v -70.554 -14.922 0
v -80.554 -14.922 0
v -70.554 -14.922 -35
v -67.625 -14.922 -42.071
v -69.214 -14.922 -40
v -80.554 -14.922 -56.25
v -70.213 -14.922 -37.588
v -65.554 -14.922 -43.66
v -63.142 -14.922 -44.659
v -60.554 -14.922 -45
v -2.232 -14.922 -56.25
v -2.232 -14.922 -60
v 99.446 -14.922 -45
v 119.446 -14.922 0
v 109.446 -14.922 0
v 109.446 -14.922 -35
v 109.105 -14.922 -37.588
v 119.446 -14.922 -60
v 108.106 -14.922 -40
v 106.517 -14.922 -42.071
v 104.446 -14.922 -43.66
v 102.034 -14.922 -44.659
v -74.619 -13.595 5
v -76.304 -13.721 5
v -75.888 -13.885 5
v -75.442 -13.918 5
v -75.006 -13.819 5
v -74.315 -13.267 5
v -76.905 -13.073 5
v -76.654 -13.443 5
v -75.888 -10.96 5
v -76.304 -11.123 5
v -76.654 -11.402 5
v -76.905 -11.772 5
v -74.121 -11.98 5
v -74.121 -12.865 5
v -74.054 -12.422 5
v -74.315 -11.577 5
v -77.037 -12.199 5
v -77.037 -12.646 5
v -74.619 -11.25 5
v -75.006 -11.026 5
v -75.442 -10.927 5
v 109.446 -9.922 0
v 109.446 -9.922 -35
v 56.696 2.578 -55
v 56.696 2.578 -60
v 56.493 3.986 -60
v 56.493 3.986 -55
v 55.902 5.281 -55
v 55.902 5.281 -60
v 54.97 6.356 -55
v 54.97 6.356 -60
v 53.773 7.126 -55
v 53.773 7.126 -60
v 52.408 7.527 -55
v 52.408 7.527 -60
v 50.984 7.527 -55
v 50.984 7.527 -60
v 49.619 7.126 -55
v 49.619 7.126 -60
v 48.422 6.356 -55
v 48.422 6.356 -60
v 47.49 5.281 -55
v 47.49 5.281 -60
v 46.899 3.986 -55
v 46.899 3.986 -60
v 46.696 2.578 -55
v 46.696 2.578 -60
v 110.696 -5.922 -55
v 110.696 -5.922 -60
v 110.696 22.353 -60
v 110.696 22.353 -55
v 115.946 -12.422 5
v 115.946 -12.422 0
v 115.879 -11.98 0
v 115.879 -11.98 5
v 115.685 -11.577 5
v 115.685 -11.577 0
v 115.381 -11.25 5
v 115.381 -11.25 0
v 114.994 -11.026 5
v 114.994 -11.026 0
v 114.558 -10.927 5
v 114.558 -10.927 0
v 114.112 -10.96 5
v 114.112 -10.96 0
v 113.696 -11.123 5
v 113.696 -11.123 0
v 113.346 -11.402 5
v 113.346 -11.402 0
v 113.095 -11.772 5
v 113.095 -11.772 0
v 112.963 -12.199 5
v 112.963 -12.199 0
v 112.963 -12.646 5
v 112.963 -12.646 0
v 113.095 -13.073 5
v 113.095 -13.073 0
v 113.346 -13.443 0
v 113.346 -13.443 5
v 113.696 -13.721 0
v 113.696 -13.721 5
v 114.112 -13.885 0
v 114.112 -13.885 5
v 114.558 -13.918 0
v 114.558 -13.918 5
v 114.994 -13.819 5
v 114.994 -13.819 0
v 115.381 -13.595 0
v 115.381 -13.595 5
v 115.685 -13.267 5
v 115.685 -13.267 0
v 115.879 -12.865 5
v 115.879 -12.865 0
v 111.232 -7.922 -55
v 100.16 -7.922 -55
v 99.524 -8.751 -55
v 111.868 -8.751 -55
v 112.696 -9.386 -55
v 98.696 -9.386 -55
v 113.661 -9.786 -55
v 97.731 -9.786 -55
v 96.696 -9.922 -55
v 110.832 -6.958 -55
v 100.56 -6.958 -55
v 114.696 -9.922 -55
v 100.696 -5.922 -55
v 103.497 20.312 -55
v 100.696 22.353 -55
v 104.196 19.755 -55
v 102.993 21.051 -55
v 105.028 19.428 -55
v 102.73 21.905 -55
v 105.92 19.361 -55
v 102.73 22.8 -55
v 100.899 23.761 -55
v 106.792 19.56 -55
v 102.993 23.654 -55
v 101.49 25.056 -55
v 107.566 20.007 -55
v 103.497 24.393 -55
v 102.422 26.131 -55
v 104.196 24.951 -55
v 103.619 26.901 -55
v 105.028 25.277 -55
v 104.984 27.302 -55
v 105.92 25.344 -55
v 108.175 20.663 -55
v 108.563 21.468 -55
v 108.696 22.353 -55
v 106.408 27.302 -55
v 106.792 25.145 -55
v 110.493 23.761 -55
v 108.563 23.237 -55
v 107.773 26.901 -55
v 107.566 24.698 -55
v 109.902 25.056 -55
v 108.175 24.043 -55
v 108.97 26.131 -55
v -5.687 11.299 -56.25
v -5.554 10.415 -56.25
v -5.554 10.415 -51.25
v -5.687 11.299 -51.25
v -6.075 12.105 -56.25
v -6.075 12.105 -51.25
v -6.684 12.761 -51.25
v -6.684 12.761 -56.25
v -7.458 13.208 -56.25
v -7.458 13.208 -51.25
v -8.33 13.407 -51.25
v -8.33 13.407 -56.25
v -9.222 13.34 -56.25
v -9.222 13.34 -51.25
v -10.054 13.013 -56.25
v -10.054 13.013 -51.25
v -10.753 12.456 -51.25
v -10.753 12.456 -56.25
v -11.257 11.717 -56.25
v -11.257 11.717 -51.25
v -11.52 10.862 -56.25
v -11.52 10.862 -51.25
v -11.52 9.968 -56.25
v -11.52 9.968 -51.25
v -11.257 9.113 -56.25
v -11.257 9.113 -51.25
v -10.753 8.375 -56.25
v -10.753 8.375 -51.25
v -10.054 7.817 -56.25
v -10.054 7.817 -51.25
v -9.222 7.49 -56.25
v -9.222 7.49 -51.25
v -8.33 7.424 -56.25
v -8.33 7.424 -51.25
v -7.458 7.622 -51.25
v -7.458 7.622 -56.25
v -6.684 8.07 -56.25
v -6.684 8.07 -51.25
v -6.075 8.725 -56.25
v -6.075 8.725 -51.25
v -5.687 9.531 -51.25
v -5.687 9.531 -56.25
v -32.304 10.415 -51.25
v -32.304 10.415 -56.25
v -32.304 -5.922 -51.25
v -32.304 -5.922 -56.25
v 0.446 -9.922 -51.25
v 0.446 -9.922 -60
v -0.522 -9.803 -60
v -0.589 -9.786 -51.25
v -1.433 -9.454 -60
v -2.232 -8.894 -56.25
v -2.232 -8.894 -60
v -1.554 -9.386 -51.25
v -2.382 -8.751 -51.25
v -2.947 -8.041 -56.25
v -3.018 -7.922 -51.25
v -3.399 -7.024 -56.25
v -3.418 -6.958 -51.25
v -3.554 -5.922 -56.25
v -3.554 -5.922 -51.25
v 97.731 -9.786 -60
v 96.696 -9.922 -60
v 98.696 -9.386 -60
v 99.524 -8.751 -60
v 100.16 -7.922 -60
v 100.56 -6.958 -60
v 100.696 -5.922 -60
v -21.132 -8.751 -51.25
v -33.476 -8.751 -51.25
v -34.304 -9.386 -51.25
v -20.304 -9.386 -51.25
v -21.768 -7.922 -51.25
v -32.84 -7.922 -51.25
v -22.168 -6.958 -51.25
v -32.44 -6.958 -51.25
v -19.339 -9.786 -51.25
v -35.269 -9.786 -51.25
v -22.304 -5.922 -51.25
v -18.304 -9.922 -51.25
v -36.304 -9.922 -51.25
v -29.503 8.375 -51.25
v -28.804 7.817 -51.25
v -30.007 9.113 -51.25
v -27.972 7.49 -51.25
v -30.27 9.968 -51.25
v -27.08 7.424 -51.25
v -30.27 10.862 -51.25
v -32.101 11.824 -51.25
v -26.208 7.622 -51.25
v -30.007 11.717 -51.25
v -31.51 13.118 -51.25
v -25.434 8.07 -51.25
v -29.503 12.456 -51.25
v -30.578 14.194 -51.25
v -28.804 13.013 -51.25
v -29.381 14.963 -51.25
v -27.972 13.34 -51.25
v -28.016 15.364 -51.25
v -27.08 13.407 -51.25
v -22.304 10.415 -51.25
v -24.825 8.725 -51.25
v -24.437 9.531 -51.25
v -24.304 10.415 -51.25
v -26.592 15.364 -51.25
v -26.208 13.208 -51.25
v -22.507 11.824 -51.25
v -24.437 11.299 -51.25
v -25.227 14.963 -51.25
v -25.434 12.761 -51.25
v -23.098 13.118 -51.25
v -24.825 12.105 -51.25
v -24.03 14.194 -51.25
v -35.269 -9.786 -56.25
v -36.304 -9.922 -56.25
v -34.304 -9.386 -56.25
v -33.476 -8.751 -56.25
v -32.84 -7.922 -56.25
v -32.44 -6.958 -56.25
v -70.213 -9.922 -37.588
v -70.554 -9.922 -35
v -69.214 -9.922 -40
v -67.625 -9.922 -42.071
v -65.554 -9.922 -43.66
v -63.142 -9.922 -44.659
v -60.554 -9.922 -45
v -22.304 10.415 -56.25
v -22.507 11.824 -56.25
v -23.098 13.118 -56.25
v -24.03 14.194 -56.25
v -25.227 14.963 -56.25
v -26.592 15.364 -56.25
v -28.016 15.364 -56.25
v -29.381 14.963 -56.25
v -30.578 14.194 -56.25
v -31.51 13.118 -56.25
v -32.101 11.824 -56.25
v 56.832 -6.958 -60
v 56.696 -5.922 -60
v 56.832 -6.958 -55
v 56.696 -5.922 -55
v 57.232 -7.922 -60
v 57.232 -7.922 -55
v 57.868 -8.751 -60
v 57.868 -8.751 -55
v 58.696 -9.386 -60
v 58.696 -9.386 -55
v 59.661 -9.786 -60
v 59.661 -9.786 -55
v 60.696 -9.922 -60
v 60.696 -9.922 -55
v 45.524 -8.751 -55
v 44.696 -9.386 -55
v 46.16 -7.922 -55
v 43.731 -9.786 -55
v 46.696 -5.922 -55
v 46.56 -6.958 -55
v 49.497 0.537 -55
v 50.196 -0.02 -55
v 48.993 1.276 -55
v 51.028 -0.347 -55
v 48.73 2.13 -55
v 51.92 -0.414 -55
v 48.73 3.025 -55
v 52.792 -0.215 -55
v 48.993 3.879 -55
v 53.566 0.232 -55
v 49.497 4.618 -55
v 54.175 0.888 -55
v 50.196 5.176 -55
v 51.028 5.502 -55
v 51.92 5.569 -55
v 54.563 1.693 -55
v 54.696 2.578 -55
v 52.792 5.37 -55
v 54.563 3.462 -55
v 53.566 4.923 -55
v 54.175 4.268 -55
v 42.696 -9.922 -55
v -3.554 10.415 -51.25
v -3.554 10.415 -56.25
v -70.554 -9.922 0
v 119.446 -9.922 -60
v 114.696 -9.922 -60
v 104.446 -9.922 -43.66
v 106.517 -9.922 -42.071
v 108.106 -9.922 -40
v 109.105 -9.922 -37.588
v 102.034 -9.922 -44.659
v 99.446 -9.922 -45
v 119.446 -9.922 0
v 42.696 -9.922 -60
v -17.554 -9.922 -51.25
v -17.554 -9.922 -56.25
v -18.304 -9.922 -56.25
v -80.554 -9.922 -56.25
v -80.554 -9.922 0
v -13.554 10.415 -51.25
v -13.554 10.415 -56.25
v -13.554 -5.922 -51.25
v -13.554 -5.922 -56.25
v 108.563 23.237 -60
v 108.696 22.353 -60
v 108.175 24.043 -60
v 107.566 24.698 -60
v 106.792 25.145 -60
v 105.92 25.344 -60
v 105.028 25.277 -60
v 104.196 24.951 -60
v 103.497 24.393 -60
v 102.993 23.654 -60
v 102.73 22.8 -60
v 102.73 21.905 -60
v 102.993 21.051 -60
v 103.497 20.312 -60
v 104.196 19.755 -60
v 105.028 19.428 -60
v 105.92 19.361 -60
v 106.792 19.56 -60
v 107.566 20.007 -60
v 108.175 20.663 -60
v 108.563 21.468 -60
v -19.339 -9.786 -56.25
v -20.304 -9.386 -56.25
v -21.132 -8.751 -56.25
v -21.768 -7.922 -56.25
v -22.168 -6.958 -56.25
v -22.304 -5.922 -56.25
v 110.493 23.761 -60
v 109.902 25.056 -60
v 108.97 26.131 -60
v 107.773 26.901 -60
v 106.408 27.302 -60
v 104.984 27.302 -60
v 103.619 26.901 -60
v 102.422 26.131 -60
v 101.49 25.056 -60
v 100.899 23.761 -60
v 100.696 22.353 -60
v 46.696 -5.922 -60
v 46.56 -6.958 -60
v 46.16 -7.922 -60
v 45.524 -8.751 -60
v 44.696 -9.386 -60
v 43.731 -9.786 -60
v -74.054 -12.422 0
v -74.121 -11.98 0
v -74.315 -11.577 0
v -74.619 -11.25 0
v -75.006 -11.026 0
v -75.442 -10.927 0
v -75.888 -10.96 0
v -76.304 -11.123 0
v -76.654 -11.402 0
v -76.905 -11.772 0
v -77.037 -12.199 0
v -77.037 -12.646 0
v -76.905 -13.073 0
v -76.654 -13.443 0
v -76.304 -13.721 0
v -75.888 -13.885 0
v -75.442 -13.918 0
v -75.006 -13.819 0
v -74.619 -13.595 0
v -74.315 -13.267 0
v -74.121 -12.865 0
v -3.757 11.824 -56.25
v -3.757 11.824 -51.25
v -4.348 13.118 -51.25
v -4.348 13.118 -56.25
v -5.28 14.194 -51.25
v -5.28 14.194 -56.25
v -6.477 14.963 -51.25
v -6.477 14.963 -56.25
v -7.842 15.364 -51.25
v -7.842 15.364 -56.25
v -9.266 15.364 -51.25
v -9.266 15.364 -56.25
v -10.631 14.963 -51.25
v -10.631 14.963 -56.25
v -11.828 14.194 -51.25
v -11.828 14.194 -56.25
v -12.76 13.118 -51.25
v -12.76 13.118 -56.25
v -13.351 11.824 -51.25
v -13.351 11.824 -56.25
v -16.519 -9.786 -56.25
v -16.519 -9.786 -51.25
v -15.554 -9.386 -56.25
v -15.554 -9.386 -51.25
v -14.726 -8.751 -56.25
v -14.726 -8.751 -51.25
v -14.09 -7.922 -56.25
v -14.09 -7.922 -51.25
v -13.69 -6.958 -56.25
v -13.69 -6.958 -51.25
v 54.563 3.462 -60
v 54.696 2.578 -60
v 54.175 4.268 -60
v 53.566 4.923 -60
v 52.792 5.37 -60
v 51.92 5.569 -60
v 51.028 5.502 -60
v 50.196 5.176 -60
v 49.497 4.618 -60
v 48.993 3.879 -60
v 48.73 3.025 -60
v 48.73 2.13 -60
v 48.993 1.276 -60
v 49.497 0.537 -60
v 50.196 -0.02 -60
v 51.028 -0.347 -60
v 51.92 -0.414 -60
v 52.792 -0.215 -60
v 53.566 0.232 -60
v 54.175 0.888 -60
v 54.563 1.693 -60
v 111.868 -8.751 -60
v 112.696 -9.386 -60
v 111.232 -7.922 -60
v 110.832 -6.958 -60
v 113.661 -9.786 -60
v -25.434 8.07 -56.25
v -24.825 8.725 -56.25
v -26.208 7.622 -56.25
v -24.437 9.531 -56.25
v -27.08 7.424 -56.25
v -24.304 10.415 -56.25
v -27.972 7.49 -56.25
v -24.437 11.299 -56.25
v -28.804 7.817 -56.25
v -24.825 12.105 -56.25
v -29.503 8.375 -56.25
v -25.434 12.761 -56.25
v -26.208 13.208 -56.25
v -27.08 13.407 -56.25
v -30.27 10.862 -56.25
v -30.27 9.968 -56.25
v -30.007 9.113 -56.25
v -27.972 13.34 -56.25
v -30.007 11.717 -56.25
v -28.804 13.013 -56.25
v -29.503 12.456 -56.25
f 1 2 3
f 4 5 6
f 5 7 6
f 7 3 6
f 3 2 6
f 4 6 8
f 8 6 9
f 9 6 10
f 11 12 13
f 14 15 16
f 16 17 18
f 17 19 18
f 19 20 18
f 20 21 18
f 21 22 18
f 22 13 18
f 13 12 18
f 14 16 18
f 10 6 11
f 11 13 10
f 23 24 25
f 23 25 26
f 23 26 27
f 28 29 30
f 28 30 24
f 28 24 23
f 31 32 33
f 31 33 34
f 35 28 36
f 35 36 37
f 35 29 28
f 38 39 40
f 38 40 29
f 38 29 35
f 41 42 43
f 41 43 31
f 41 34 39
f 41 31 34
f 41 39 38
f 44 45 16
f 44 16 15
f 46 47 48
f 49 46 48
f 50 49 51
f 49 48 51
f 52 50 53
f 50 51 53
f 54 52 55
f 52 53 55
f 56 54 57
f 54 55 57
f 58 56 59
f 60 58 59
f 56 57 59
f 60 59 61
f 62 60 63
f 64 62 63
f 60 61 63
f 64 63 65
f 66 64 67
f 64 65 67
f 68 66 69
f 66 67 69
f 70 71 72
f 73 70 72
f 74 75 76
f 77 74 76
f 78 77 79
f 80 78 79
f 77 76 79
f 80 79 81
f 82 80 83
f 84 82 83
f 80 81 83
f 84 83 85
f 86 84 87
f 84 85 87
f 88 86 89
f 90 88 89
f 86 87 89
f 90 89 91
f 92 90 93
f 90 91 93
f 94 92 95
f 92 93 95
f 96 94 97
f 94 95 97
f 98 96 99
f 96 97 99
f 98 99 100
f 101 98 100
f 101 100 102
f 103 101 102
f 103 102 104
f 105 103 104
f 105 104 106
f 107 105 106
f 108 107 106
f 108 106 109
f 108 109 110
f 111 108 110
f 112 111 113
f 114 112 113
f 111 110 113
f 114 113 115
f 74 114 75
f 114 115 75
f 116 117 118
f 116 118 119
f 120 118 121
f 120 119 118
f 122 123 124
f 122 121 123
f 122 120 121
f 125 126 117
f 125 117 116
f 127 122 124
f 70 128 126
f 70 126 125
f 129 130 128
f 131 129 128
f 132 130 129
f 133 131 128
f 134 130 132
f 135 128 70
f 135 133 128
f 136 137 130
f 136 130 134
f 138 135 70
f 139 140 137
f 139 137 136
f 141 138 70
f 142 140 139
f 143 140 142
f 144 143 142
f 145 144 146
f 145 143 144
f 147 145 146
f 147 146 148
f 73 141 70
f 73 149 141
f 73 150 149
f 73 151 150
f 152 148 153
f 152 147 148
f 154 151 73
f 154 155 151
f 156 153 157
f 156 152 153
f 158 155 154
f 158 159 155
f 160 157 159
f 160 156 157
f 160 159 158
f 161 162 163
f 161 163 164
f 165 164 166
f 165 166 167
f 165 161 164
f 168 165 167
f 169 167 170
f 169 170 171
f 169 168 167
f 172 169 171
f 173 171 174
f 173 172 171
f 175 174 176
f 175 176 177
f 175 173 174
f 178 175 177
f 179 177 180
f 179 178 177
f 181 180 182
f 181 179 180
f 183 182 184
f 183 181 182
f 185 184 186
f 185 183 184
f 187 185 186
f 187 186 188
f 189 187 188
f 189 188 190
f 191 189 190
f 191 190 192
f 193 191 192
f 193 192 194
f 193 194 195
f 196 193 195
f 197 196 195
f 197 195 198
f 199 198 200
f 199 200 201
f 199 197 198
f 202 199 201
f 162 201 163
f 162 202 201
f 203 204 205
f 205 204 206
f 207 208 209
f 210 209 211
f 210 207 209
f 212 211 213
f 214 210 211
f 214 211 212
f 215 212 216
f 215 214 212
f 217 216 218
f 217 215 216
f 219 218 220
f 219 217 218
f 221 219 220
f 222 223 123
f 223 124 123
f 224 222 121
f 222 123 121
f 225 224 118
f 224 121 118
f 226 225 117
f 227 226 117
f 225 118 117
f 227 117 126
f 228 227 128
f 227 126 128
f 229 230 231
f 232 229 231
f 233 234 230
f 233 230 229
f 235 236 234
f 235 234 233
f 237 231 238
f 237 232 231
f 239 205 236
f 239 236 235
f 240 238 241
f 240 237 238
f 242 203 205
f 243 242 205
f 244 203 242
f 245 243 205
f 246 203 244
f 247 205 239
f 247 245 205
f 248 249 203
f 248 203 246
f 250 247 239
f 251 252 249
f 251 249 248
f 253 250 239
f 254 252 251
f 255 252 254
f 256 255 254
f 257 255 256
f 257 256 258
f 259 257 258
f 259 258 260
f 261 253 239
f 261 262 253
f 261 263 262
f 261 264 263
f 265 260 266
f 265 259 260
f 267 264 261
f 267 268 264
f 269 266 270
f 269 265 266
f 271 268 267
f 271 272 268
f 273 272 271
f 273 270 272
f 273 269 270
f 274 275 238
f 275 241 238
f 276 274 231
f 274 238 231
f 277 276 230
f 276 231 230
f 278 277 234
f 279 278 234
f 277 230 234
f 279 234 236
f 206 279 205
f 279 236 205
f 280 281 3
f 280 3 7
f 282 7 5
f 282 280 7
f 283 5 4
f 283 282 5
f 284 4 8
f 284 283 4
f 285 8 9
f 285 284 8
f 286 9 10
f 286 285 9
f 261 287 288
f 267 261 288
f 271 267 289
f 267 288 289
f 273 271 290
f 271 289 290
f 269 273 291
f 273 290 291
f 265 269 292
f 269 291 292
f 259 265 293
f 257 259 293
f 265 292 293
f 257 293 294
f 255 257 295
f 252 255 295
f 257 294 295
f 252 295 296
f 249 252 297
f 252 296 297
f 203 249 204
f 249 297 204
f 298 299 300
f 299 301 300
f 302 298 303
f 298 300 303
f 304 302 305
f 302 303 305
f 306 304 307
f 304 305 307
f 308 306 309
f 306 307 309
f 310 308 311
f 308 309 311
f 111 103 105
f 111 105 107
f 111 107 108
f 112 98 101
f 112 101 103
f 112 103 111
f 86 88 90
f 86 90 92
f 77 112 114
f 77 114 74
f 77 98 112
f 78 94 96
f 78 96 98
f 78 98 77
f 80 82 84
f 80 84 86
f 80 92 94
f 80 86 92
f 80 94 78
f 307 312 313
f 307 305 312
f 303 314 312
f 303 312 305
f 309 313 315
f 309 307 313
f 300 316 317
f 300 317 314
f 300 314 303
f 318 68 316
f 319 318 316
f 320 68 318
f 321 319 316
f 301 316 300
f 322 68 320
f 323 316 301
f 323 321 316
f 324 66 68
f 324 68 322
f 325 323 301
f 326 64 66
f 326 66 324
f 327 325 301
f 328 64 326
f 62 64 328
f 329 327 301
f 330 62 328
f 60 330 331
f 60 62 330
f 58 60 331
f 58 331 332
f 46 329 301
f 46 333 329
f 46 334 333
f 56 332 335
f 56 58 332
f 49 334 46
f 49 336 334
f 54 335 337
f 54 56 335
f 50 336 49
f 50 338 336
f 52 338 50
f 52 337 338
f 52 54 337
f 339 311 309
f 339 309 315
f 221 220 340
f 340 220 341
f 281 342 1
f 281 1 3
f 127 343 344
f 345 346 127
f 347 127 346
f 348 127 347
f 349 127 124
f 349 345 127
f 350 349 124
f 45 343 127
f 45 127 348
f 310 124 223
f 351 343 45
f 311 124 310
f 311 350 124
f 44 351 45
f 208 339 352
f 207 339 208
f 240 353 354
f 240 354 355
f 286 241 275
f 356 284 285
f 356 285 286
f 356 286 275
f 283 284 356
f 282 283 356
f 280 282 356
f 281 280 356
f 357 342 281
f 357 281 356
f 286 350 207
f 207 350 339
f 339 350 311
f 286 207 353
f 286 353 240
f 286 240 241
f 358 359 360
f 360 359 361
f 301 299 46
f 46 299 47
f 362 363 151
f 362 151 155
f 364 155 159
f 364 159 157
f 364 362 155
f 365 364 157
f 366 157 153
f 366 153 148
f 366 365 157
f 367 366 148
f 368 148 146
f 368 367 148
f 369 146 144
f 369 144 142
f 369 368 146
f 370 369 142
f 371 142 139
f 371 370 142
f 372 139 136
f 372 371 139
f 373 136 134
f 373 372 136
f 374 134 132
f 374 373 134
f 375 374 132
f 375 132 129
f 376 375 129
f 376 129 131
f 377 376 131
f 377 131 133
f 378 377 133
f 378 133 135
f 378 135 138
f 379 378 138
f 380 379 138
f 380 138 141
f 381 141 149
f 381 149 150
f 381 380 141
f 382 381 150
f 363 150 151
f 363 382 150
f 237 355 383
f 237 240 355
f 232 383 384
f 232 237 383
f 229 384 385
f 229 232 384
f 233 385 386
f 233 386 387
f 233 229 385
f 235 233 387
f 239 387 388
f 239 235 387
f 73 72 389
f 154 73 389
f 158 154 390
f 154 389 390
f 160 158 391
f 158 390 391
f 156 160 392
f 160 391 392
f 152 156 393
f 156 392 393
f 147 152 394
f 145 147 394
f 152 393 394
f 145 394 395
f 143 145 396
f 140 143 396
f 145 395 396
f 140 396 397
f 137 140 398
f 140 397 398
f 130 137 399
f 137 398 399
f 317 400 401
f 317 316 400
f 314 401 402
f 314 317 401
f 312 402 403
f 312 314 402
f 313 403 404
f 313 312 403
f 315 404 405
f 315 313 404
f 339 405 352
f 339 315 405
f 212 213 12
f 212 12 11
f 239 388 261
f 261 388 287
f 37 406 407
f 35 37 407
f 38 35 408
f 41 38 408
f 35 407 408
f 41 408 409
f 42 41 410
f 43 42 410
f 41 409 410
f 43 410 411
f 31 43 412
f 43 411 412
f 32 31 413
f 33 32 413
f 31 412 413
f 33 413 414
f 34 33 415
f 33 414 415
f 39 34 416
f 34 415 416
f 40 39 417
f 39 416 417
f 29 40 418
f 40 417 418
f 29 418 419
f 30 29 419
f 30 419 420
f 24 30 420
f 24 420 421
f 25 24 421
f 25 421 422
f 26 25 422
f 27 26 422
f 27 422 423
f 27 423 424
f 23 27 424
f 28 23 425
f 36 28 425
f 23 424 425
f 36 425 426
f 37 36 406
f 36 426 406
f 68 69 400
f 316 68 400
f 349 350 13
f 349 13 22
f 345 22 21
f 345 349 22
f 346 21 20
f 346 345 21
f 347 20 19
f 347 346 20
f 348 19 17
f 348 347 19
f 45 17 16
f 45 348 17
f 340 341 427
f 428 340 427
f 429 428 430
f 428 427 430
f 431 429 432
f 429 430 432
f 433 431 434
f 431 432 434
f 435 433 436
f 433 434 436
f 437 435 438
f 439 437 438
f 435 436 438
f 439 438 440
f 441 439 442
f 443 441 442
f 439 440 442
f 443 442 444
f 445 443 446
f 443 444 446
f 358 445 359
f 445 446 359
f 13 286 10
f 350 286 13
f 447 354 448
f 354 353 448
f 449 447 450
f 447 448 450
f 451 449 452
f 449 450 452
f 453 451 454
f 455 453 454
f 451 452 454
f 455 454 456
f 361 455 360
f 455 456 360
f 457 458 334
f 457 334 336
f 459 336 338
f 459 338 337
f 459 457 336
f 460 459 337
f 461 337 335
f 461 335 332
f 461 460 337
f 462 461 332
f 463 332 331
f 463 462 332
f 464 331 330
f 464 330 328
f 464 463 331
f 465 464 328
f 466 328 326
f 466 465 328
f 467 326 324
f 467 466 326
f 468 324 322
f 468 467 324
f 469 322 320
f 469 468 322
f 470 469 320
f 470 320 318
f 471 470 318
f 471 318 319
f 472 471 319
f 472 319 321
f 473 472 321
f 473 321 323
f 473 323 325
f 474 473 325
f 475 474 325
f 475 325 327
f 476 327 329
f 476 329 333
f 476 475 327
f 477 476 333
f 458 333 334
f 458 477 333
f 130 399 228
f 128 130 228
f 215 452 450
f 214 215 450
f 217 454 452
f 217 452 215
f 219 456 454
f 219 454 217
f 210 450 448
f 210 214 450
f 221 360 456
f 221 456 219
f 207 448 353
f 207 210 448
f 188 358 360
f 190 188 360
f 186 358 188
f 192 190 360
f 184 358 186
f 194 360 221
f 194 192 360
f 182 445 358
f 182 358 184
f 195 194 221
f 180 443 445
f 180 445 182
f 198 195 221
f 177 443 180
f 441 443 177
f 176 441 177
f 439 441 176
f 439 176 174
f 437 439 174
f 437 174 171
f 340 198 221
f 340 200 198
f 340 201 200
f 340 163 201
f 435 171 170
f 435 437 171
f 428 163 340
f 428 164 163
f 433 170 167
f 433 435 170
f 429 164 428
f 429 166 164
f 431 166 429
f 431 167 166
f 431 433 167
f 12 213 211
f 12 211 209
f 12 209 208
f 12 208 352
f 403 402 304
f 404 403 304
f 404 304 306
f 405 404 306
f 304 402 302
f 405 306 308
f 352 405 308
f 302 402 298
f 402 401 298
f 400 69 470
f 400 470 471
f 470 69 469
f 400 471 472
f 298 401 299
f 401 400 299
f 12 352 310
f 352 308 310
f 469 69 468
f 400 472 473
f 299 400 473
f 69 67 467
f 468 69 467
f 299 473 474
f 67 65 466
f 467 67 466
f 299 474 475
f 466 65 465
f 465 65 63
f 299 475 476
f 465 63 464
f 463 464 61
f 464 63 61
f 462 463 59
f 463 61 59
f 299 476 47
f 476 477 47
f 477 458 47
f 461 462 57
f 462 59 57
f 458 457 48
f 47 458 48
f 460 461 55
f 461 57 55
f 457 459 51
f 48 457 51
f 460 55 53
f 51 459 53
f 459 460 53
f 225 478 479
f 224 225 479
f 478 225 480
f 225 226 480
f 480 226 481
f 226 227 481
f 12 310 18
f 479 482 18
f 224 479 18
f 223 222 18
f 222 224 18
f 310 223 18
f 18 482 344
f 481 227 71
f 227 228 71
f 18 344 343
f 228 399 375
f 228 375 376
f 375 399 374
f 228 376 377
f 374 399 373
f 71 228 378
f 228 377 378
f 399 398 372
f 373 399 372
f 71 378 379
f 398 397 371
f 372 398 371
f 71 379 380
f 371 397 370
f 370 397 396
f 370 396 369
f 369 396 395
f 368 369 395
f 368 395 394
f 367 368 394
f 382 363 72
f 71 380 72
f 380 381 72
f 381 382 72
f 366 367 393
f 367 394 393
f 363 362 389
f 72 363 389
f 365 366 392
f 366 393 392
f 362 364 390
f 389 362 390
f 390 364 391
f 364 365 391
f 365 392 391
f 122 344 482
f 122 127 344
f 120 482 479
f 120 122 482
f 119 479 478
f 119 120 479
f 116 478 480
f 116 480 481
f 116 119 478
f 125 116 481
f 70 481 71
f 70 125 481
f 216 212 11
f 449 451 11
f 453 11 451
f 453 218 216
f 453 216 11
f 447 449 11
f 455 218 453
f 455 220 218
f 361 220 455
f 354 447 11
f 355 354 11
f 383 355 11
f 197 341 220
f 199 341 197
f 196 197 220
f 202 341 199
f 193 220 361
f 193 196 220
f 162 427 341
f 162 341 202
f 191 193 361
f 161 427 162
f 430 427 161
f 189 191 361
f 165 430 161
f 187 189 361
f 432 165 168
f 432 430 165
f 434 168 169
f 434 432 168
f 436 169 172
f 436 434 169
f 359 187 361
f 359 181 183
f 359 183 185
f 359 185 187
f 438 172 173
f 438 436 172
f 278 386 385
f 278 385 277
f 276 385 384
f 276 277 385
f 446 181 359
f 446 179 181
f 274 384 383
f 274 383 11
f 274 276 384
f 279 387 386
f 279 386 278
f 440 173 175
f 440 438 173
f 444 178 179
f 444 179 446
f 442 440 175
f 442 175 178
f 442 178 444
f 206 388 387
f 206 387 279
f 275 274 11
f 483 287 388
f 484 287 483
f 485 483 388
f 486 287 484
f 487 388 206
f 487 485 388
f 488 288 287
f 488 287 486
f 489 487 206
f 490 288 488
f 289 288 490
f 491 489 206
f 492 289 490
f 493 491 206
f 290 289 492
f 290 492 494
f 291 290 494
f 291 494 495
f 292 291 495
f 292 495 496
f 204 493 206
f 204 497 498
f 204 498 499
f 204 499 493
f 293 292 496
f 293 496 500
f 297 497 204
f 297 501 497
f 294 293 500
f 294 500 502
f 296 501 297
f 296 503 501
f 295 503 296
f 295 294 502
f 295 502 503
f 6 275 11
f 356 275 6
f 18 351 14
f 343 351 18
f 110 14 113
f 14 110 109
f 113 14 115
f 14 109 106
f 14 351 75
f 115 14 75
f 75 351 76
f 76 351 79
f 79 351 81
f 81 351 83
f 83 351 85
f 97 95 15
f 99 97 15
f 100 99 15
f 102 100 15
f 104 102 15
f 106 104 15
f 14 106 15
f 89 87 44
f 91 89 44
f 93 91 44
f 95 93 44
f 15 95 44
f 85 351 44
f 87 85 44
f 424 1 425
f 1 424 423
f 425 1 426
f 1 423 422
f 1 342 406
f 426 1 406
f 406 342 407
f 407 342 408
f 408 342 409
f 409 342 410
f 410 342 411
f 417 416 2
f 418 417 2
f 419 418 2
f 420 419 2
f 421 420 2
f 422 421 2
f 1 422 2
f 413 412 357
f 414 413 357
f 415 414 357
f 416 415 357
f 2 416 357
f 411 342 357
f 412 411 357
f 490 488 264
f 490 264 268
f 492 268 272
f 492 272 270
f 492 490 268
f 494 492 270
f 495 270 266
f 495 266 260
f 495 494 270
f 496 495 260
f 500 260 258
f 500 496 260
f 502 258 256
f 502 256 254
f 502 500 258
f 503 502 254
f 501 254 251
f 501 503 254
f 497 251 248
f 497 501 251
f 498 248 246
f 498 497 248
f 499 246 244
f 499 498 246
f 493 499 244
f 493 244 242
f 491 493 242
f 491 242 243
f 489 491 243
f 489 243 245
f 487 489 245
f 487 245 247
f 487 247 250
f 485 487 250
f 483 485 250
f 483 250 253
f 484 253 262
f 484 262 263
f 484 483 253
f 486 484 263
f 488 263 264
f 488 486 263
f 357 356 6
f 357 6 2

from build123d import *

# Parameters (mm, degrees)
BOSS_EXTRUDE1_DEPTH     = 40
SKETCH2_R               = 24
BOSS_EXTRUDE2_DEPTH     = 40
SKETCH3_R               = 24
BOSS_EXTRUDE3_DEPTH     = 40
SCALE1_SCALE            = 0.125
FILLET3_R               = 4
FILLET4_R               = 4
CUT_EXTRUDE1_DEPTH      = 38.275
CUT_EXTRUDE1_DEPTH_BACK = 6
CUT_EXTRUDE2_DEPTH      = 38.275
CUT_EXTRUDE2_DEPTH_BACK = 6
SKETCH6_R               = 1.5
BOSS_EXTRUDE4_DEPTH     = 5


with BuildPart() as part:
    # Sketch1 → Boss-Extrude1 (new body)
    with BuildSketch(Plane(origin=(0, 0, 0), x_dir=(1, 0, 0), z_dir=(0, 1, 0))):
        Polygon((-173.422280891, 480), (-173.422280891, 450), (-800, 450), (-800, -450), (-173.422280891, -450), (-173.422280891, -480), (800, -480), (800, 480), align=None)
    extrude(amount=-BOSS_EXTRUDE1_DEPTH)

    # Sketch2 → Boss-Extrude2 (add)
    with BuildSketch(Plane.XY.offset(480)):
        with BuildLine():
            Line((218, 0), (298, 0))
            Line((298, 0), (298, 100))
            ThreePointArc((298, 100), (258, 140), (218, 100))
            Line((218, 100), (218, 0))
        make_face()
        with Locations((258, 100)):
            Circle(SKETCH2_R, mode=Mode.SUBTRACT)
        with BuildLine():
            Line((650, 258.2), (650, 0))
            Line((650, 0), (730, 0))
            Line((730, 0), (730, 258.2))
            ThreePointArc((730, 258.2), (690, 298.2), (650, 258.2))
        make_face()
        with Locations((690, 258.2)):
            Circle(SKETCH2_R, mode=Mode.SUBTRACT)
        Polygon((650, 0), (298, 0), (218, 0), (-173.422280891, 0), (-173.422280891, -40), (800, -40), (800, 0), (730, 0), align=None)
    extrude(amount=-BOSS_EXTRUDE2_DEPTH)

    # Mirror1: part across plane


with BuildPart() as part_1:
    add(part.part)
    add(part.part.mirror(Plane.XY))

    # Sketch3 → Boss-Extrude3 (add)
    with BuildSketch(Plane.XY.offset(450)):
        with BuildLine():
            Line((-414, 0), (-334, 0))
            Line((-334, 0), (-334, 162.7))
            ThreePointArc((-334, 162.7), (-374, 202.7), (-414, 162.7))
            Line((-414, 162.7), (-414, 0))
        make_face()
        with Locations((-374, 162.7)):
            Circle(SKETCH3_R, mode=Mode.SUBTRACT)
        with BuildLine():
            Line((-264, 0), (-184, 0))
            Line((-184, 0), (-184, 162.7))
            ThreePointArc((-184, 162.7), (-224, 202.7), (-264, 162.7))
            Line((-264, 162.7), (-264, 0))
        make_face()
        with Locations((-224, 162.7)):
            Circle(SKETCH3_R, mode=Mode.SUBTRACT)
    boss_extrude3 = extrude(amount=-BOSS_EXTRUDE3_DEPTH)

    # Mirror2: Boss-Extrude3 across plane
    add(boss_extrude3.mirror(Plane.XY))


with BuildPart() as part_2:
    # Scale1: scaled about (22.22402446, -11.339866564, 0)
    add(part_1.part.scale(SCALE1_SCALE).moved(Location((19.446021402, -9.922383243, 0))))

    # Fillet3
    fillet3_edges = [part_2.edges().sort_by_distance(p)[0] for p in [
        (-32.303978598, -9.922383243, 53.75),
        (-13.553978598, -9.922383243, 53.75),
        (-32.303978598, -9.922383243, -53.75),
        (-13.553978598, -9.922383243, -53.75),
        (46.696021403, -9.922383243, 57.5),
        (100.696021403, -9.922383243, 57.5),
        (100.696021403, -9.922383243, -57.5),
        (46.696021403, -9.922383243, -57.5),
    ]]
    fillet(fillet3_edges, radius=FILLET3_R)

    # Fillet4
    fillet4_edges = [part_2.edges().sort_by_distance(p)[0] for p in [
        (-3.553978598, -9.922383243, -53.75),
        (-22.303978598, -9.922383243, -53.75),
        (56.696021403, -9.922383243, -57.5),
        (110.696021402, -9.922383243, -57.5),
        (110.696021402, -9.922383243, 57.5),
        (56.696021403, -9.922383243, 57.5),
        (-3.553978598, -9.922383243, 53.75),
        (-22.303978598, -9.922383243, 53.75),
    ]]
    fillet(fillet4_edges, radius=FILLET4_R)

    # Sketch4 → Cut-Extrude1 (cut, two sides)
    with BuildSketch(Plane(origin=(0, -9.922383244, 0), x_dir=(1, 0, 0), z_dir=(0, 1, 0))) as cut_extrude1_sk:
        with BuildLine():
            Line((-60.553978598, 45), (99.446021402, 45))
            ThreePointArc((99.446021402, 45), (106.517089214, 42.071067812), (109.446021402, 35))
            Line((109.446021402, 35), (109.446021402, -35))
            ThreePointArc((109.446021402, -35), (106.517089214, -42.071067812), (99.446021402, -45))
            Line((99.446021402, -45), (-60.553978598, -45))
            ThreePointArc((-60.553978598, -45), (-67.62504641, -42.071067812), (-70.553978598, -35))
            Line((-70.553978598, -35), (-70.553978598, 35))
            ThreePointArc((-70.553978598, 35), (-67.62504641, 42.071067812), (-60.553978598, 45))
        make_face()
    extrude(amount=CUT_EXTRUDE1_DEPTH, mode=Mode.SUBTRACT)
    extrude(cut_extrude1_sk.sketch, amount=-CUT_EXTRUDE1_DEPTH_BACK, mode=Mode.SUBTRACT)

    # Sketch5 → Cut-Extrude2 (cut, two sides)
    with BuildSketch(Plane(origin=(0, -9.922383244, 0), x_dir=(1, 0, 0), z_dir=(0, 1, 0))) as cut_extrude2_sk:
        Polygon((0, 0), (123.509842575, 0), (123.509842575, -66.212941814), (-94.641009198, -66.212941814), (-94.641009198, 0), align=None)
    extrude(amount=CUT_EXTRUDE2_DEPTH, mode=Mode.SUBTRACT)
    extrude(cut_extrude2_sk.sketch, amount=-CUT_EXTRUDE2_DEPTH_BACK, mode=Mode.SUBTRACT)

    # Sketch6 → Boss-Extrude4 (add)
    with BuildSketch(Plane.XY):
        with Locations((-75.553978598, -12.422383244)):
            Circle(SKETCH6_R)
        with Locations((114.446021402, -12.422383244)):
            Circle(SKETCH6_R)
    extrude(amount=BOSS_EXTRUDE4_DEPTH)


solid = part_2.part
